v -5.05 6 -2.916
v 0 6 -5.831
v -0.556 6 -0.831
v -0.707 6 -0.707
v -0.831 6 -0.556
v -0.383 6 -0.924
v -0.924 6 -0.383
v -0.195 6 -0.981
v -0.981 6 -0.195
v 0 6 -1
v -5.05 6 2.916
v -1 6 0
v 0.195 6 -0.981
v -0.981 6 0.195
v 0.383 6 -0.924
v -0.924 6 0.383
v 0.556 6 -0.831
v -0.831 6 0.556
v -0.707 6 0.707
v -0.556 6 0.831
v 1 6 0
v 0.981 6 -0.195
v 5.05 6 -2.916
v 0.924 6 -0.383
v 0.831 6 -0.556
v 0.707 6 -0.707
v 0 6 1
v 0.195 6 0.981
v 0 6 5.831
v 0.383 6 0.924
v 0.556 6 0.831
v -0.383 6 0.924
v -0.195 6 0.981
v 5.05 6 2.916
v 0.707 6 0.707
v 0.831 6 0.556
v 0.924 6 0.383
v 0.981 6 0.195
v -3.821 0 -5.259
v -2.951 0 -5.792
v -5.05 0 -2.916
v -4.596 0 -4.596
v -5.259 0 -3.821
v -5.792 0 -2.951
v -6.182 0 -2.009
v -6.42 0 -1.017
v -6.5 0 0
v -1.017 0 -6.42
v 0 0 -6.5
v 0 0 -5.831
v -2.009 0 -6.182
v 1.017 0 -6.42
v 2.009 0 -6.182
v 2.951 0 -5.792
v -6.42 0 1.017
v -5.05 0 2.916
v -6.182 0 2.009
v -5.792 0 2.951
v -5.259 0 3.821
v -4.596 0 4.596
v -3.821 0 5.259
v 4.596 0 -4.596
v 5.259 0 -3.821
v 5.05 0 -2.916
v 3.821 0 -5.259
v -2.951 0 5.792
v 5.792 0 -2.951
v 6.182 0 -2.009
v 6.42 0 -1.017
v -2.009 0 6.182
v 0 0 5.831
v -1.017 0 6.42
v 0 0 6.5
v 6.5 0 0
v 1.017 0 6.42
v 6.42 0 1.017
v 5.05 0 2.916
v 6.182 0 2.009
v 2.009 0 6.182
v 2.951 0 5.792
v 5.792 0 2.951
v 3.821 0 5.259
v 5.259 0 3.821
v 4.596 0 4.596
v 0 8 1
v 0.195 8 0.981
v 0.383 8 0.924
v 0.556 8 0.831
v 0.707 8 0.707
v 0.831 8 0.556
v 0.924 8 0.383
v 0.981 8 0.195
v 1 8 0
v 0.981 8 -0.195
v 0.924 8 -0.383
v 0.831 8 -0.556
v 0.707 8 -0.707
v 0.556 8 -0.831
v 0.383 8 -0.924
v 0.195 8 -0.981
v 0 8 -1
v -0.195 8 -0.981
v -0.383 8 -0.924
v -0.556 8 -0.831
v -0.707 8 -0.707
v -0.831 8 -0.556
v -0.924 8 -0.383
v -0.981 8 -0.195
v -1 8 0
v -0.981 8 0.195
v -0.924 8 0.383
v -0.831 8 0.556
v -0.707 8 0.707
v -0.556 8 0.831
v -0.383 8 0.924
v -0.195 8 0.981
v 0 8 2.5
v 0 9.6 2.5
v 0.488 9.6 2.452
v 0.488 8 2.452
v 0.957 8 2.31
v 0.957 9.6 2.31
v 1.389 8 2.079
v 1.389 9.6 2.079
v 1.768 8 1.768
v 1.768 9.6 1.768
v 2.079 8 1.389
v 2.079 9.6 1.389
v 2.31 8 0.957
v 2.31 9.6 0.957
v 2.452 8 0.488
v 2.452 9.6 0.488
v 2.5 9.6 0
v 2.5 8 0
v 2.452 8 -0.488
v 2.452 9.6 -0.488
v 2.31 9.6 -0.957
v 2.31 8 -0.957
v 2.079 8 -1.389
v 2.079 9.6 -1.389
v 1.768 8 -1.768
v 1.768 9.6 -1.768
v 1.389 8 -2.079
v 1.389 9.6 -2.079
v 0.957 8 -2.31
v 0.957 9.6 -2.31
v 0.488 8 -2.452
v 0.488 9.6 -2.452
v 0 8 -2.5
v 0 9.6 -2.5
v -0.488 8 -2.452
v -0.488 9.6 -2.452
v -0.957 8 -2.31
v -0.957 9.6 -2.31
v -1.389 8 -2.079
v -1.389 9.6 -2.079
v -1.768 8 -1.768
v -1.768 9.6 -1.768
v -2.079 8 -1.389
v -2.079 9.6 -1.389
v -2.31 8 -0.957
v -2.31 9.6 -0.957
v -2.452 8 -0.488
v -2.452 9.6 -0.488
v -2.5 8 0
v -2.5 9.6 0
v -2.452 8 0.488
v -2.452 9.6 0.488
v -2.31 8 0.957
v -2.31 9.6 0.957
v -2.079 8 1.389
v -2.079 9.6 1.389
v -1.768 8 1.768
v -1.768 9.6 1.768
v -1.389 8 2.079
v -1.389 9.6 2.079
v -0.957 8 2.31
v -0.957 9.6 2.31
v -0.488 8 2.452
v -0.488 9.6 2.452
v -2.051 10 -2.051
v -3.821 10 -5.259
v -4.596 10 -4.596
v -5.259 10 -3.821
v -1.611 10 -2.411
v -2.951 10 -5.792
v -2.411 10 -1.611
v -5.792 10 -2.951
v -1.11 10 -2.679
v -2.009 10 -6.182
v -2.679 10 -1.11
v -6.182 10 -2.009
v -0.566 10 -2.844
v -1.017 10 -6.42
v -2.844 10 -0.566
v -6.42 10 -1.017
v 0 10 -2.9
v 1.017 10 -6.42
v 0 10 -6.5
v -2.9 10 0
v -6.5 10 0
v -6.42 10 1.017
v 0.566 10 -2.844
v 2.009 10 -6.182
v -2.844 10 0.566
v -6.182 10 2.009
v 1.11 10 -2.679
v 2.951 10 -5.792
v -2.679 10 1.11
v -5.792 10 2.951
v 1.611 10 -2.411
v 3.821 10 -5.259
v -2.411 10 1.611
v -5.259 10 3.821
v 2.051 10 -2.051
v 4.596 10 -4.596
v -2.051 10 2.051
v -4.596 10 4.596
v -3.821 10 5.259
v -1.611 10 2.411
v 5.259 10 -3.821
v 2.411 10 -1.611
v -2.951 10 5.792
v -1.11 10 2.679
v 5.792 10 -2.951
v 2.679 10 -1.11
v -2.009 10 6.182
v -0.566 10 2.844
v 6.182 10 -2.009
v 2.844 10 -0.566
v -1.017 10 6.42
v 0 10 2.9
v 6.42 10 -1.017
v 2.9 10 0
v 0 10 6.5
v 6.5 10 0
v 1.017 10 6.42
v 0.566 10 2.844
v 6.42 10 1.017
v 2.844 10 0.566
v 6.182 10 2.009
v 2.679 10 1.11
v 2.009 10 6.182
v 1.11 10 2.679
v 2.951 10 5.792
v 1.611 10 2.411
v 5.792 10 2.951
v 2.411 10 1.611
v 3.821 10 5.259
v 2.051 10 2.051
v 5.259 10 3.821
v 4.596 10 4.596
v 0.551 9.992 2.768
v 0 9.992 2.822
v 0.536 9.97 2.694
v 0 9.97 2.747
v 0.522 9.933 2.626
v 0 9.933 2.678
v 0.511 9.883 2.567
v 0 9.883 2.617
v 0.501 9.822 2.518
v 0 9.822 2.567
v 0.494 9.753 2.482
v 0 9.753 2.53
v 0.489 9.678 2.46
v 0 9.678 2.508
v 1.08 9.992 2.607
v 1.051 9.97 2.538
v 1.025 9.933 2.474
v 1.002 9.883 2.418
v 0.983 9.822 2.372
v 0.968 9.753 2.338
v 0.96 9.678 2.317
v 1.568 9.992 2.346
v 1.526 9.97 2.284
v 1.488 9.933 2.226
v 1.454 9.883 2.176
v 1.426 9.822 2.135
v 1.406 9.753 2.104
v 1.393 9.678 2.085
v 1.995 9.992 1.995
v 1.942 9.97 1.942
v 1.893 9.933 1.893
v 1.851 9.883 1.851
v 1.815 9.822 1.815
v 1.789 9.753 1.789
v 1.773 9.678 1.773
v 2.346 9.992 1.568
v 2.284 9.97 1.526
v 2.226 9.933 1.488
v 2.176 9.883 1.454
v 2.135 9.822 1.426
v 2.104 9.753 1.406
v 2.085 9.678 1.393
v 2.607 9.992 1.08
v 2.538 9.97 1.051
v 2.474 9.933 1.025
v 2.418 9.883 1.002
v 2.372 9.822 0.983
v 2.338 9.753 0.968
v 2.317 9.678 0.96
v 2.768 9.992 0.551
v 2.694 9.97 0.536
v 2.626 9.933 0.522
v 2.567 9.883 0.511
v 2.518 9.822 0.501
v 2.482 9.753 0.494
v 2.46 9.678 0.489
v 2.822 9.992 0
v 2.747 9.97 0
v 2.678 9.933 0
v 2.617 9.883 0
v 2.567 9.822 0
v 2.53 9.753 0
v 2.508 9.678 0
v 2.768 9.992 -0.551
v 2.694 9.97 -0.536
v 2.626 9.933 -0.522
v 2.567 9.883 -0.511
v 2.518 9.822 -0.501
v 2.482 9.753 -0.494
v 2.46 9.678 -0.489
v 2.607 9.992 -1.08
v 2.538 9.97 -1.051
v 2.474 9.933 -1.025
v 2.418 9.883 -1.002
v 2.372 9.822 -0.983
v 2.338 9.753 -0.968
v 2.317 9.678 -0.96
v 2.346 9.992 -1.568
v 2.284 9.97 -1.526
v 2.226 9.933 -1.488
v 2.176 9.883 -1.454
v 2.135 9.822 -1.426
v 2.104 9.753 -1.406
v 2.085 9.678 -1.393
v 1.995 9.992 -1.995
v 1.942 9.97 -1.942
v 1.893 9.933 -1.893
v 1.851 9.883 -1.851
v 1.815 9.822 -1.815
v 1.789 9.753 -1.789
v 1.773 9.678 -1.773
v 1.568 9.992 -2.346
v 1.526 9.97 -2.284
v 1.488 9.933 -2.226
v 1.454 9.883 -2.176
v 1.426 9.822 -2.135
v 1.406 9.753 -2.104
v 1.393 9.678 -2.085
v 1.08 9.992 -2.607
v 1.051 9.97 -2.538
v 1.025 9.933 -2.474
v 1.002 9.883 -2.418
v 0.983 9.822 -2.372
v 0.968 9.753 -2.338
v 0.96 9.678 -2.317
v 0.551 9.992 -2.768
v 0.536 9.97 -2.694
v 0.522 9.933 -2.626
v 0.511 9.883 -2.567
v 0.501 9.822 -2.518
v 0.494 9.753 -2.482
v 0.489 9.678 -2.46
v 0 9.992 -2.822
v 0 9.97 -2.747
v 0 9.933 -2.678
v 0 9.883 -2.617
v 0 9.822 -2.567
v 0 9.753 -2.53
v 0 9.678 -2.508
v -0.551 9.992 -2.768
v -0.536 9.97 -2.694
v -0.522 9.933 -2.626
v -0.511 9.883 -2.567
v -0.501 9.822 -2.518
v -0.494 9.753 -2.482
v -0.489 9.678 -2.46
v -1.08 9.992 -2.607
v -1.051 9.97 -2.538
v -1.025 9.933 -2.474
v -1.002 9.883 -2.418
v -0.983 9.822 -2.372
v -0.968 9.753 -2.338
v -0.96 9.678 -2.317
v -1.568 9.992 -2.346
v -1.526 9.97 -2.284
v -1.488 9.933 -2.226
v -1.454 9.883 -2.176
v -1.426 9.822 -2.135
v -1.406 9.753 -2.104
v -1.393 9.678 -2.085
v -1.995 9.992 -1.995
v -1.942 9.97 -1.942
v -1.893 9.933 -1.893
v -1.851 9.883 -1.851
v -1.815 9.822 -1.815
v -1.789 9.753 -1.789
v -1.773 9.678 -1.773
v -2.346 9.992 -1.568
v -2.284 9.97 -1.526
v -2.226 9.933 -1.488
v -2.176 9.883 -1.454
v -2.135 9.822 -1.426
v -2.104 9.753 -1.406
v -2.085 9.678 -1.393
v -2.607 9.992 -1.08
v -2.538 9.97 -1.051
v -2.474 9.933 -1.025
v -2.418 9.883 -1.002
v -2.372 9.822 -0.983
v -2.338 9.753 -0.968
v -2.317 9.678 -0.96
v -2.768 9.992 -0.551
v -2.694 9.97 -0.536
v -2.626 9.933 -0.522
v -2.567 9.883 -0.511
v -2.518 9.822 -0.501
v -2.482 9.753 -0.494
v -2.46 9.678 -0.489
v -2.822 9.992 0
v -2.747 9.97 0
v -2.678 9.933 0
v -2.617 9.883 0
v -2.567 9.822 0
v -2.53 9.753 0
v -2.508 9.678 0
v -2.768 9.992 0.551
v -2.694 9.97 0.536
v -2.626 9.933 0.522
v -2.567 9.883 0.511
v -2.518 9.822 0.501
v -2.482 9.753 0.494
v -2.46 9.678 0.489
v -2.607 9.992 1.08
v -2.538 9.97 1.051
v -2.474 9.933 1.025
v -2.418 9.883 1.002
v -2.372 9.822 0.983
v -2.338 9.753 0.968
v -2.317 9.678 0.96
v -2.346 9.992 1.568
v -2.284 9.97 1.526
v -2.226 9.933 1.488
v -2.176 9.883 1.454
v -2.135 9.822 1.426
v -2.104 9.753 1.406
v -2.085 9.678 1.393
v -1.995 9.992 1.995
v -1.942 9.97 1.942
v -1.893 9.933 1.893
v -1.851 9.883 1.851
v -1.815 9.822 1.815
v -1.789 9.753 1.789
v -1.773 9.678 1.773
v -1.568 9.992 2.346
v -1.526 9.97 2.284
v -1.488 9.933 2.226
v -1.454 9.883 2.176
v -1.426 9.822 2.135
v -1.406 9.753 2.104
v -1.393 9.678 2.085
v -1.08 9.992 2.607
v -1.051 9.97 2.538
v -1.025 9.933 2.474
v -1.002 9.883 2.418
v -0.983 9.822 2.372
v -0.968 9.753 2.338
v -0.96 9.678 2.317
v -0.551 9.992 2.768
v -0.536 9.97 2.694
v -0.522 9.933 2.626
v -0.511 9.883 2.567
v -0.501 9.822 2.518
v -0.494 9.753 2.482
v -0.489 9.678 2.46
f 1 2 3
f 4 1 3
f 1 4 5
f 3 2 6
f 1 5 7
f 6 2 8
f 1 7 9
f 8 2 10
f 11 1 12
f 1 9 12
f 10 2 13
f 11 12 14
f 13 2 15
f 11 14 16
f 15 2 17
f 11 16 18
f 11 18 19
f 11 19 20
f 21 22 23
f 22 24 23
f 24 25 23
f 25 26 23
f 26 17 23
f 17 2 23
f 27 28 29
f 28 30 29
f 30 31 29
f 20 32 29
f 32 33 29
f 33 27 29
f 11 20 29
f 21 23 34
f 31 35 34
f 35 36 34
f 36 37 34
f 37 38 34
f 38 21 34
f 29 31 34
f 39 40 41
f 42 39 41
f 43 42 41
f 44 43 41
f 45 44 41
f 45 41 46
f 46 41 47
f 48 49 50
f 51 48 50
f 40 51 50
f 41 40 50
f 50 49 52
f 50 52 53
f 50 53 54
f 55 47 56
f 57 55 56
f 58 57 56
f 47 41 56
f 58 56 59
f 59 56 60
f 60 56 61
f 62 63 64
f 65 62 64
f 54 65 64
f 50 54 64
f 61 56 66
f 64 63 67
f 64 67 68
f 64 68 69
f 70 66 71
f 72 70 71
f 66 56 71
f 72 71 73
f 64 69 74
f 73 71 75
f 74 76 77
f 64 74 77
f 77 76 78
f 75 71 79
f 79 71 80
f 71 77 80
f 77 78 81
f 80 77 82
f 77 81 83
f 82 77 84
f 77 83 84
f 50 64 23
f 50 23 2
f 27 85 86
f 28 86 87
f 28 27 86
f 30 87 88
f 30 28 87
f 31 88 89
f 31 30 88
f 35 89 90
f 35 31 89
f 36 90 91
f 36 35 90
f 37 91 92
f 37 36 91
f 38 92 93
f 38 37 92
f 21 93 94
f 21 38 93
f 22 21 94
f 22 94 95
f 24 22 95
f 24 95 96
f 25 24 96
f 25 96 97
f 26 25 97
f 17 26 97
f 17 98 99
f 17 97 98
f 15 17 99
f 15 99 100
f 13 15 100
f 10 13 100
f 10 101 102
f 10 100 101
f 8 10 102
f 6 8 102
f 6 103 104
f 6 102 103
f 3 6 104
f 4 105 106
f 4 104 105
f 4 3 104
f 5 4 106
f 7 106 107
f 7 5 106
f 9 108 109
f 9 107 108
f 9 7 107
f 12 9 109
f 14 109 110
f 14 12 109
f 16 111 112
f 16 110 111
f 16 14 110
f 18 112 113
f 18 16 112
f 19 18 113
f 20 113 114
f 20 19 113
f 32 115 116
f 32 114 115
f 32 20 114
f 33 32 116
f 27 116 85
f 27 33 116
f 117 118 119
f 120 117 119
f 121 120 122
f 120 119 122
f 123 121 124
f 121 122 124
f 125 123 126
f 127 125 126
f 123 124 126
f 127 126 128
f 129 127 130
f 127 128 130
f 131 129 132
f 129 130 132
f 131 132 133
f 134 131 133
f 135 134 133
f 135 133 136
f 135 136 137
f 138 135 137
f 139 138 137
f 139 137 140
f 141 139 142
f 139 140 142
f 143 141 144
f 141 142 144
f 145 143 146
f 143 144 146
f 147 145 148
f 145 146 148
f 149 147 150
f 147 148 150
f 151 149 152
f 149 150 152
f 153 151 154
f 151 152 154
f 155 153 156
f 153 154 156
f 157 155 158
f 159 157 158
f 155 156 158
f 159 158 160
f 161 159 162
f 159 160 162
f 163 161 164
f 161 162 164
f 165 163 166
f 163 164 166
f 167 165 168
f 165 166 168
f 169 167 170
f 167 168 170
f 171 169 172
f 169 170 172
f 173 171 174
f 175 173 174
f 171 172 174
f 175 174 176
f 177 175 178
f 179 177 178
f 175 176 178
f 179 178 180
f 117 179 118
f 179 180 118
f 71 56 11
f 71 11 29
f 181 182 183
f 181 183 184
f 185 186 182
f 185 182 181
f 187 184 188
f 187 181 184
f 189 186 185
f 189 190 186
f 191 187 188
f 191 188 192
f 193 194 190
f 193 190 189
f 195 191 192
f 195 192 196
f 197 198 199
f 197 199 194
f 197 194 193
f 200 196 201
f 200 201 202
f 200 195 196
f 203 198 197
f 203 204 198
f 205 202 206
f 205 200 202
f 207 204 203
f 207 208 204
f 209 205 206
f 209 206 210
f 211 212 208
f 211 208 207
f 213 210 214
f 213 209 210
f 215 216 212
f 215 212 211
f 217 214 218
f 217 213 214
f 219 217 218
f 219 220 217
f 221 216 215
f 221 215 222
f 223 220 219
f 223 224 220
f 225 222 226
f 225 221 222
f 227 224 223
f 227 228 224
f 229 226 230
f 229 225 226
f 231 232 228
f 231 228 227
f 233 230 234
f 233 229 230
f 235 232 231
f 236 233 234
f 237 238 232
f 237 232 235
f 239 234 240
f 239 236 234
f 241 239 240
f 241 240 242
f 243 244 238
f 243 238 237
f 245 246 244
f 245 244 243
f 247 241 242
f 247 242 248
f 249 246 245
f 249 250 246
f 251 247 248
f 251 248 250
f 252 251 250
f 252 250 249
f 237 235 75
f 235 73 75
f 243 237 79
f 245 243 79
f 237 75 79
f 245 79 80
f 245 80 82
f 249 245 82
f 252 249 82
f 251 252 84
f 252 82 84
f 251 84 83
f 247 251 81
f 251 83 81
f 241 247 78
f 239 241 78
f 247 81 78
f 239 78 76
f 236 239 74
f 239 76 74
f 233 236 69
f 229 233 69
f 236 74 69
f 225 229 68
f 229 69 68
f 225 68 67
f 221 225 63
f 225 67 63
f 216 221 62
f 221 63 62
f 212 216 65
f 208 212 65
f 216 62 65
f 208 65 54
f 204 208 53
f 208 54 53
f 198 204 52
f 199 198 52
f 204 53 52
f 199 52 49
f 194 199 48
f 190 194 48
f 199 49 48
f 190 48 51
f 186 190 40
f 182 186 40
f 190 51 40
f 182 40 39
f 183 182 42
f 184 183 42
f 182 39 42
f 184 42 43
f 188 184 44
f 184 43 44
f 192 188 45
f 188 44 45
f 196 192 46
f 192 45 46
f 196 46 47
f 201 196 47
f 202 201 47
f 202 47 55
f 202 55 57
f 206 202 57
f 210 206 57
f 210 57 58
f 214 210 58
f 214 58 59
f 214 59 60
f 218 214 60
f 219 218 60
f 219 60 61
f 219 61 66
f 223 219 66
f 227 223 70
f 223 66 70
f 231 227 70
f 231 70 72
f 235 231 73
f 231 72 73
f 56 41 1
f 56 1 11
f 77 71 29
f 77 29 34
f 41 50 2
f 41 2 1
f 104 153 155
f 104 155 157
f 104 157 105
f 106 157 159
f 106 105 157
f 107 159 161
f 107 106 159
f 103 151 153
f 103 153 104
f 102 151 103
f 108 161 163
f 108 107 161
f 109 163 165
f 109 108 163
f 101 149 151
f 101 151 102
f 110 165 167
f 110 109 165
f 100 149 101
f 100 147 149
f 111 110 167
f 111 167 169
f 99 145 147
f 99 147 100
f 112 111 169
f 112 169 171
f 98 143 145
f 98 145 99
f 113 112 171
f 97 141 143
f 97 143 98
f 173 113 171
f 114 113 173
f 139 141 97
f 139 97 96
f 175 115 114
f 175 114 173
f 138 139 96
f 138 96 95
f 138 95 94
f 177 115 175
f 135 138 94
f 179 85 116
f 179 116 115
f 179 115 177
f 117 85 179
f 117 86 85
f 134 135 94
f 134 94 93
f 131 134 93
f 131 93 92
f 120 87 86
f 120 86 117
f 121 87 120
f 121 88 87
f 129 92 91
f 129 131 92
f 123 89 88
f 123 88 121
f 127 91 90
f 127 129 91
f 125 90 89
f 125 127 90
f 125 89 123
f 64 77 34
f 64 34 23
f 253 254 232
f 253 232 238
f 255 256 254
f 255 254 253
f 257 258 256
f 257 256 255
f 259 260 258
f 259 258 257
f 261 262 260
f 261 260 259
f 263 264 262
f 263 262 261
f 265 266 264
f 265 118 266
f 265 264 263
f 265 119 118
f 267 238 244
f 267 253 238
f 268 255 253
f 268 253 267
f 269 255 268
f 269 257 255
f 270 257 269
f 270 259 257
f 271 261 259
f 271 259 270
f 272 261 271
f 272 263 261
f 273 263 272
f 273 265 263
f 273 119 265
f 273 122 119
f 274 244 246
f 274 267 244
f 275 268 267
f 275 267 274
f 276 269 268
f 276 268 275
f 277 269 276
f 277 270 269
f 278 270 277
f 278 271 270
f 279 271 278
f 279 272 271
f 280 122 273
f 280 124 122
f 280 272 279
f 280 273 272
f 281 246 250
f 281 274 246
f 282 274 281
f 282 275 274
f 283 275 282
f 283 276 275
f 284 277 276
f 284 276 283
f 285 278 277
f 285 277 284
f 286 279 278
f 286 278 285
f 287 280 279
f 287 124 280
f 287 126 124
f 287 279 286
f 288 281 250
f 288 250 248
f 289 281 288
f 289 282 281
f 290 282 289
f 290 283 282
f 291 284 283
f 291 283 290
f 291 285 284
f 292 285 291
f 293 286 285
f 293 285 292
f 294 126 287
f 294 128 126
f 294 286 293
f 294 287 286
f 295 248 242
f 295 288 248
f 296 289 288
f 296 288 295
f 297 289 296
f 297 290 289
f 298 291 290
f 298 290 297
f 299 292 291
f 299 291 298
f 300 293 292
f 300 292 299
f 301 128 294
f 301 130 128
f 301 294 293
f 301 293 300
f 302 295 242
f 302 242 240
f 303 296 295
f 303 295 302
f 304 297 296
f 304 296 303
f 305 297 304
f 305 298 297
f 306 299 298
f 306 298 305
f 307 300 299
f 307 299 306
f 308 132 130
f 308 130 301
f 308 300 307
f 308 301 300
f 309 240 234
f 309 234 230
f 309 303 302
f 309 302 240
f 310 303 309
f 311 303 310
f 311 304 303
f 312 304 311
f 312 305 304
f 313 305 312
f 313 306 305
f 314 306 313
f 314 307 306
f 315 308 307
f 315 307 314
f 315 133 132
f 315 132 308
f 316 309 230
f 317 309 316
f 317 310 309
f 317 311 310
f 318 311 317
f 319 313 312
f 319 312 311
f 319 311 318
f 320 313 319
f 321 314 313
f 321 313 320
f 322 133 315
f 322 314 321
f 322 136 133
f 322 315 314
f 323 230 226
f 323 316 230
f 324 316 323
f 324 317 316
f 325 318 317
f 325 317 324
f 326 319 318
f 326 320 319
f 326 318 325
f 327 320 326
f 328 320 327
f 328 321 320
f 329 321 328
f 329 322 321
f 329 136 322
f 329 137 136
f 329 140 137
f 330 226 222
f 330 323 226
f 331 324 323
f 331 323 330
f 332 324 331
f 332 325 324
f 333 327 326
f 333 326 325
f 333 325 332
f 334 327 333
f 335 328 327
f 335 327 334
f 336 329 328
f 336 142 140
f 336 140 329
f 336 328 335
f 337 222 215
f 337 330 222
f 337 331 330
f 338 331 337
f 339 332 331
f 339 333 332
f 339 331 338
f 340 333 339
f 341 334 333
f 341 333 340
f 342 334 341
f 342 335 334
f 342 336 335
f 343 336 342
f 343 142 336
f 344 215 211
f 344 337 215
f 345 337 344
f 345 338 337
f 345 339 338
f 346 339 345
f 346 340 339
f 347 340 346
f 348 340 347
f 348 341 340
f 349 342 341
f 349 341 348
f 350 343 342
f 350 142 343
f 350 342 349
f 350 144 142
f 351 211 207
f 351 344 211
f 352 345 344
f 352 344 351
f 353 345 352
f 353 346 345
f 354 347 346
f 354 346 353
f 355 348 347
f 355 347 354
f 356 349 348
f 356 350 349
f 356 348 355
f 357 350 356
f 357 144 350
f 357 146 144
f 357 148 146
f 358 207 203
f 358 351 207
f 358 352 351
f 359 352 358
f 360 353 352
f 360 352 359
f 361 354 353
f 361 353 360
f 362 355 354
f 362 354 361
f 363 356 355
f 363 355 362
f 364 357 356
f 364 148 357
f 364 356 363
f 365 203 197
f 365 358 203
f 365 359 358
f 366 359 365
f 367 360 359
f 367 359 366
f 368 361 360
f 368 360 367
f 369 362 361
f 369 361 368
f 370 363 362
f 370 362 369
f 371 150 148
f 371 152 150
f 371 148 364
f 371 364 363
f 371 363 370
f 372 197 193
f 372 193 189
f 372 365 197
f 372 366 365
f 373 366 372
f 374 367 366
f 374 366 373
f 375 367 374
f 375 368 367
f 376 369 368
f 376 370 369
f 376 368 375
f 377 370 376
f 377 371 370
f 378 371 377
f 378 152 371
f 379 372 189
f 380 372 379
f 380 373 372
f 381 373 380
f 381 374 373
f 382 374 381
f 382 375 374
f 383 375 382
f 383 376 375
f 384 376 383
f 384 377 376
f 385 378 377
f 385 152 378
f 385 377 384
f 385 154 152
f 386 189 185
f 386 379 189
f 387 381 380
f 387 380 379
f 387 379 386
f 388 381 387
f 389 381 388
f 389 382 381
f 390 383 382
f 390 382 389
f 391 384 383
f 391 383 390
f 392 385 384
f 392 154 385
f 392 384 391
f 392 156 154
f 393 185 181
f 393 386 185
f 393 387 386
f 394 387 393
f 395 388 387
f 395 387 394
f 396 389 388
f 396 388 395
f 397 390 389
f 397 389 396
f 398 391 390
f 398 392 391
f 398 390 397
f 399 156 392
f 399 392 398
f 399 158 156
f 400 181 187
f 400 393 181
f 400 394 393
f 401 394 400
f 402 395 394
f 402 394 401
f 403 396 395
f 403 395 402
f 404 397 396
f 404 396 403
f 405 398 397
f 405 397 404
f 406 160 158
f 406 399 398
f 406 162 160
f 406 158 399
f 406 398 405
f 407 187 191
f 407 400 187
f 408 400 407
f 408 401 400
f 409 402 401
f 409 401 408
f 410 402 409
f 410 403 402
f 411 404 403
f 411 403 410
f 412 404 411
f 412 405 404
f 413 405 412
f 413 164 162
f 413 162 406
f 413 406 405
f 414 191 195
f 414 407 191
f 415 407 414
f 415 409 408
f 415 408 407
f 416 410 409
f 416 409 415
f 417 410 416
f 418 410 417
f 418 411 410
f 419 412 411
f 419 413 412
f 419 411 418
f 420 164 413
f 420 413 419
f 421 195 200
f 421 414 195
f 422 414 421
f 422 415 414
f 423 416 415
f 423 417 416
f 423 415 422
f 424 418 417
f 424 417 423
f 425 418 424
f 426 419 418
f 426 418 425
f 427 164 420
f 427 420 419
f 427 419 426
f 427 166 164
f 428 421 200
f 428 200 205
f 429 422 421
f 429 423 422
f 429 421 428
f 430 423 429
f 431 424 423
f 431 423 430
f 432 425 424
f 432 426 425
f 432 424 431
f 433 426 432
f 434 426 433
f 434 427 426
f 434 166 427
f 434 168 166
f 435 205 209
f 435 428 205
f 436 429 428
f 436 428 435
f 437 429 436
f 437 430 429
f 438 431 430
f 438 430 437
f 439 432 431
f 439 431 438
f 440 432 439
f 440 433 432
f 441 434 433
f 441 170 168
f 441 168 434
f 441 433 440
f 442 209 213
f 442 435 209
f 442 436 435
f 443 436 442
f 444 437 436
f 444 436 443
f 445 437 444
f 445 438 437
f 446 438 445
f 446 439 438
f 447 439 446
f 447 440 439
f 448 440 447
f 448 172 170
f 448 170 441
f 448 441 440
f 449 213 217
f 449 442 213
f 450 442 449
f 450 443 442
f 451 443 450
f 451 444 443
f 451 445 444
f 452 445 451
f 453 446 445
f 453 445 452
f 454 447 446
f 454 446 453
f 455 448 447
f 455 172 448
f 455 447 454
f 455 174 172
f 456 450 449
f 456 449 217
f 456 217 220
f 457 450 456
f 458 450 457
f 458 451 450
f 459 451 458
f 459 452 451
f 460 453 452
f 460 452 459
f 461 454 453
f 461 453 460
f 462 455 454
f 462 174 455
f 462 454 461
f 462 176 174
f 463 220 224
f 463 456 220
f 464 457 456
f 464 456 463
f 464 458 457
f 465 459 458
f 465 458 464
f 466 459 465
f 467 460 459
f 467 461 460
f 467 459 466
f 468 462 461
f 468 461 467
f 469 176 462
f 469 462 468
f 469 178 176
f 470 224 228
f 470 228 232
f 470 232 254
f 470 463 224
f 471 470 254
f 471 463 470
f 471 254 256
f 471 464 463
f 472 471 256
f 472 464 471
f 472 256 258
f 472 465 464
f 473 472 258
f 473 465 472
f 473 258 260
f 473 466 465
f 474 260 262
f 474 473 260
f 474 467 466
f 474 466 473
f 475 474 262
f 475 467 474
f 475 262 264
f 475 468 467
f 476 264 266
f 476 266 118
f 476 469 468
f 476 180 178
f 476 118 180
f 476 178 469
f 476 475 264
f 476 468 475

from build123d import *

# Parameters (mm, degrees)
SKETCH1_R           = 6.5
BOSS_EXTRUDE1_DEPTH = 6
SKETCH3_R           = 6.5
SKETCH3_R_2         = 1
BOSS_EXTRUDE2_DEPTH = 4
SKETCH4_R           = 2.5
CUT_EXTRUDE1_DEPTH  = 2
FILLET1_R           = 0.4


with BuildPart() as part:
    # Sketch1 → Boss-Extrude1 (new body)
    with BuildSketch(Plane(origin=(0, 0, 0), x_dir=(1, 0, 0), z_dir=(0, 1, 0))):
        with Locations(Location((0, 0, 0), (0, 0, 270))):
            Circle(SKETCH1_R)
        Polygon((5.05, -2.915618859), (5.05, 2.915618859), (0, 5.831237719), (-5.05, 2.915618859), (-5.05, -2.915618859), (0, -5.831237719), align=None, mode=Mode.SUBTRACT)
    extrude(amount=BOSS_EXTRUDE1_DEPTH)

    # Sketch3 → Boss-Extrude2 (add)
    with BuildSketch(Plane(origin=(0, 6, 0), x_dir=(1, 0, 0), z_dir=(0, 1, 0))):
        with Locations(Location((0, 0, 0), (0, 0, 270))):
            Circle(SKETCH3_R)
        with Locations(Location((0, 0, 0), (0, 0, 270))):
            Circle(SKETCH3_R_2, mode=Mode.SUBTRACT)
    extrude(amount=BOSS_EXTRUDE2_DEPTH)

    # Sketch4 → Cut-Extrude1 (cut)
    with BuildSketch(Plane(origin=(0, 10, 0), x_dir=(1, 0, 0), z_dir=(0, 1, 0))):
        with Locations(Location((0, 0, 0), (0, 0, 270))):
            Circle(SKETCH4_R)
    extrude(amount=-CUT_EXTRUDE1_DEPTH, mode=Mode.SUBTRACT)

    # Fillet1
    fillet1_edges = [part.edges().sort_by_distance(p)[0] for p in [
        (0, 10, -2.5),
    ]]
    fillet(fillet1_edges, radius=FILLET1_R)


solid = part.part
